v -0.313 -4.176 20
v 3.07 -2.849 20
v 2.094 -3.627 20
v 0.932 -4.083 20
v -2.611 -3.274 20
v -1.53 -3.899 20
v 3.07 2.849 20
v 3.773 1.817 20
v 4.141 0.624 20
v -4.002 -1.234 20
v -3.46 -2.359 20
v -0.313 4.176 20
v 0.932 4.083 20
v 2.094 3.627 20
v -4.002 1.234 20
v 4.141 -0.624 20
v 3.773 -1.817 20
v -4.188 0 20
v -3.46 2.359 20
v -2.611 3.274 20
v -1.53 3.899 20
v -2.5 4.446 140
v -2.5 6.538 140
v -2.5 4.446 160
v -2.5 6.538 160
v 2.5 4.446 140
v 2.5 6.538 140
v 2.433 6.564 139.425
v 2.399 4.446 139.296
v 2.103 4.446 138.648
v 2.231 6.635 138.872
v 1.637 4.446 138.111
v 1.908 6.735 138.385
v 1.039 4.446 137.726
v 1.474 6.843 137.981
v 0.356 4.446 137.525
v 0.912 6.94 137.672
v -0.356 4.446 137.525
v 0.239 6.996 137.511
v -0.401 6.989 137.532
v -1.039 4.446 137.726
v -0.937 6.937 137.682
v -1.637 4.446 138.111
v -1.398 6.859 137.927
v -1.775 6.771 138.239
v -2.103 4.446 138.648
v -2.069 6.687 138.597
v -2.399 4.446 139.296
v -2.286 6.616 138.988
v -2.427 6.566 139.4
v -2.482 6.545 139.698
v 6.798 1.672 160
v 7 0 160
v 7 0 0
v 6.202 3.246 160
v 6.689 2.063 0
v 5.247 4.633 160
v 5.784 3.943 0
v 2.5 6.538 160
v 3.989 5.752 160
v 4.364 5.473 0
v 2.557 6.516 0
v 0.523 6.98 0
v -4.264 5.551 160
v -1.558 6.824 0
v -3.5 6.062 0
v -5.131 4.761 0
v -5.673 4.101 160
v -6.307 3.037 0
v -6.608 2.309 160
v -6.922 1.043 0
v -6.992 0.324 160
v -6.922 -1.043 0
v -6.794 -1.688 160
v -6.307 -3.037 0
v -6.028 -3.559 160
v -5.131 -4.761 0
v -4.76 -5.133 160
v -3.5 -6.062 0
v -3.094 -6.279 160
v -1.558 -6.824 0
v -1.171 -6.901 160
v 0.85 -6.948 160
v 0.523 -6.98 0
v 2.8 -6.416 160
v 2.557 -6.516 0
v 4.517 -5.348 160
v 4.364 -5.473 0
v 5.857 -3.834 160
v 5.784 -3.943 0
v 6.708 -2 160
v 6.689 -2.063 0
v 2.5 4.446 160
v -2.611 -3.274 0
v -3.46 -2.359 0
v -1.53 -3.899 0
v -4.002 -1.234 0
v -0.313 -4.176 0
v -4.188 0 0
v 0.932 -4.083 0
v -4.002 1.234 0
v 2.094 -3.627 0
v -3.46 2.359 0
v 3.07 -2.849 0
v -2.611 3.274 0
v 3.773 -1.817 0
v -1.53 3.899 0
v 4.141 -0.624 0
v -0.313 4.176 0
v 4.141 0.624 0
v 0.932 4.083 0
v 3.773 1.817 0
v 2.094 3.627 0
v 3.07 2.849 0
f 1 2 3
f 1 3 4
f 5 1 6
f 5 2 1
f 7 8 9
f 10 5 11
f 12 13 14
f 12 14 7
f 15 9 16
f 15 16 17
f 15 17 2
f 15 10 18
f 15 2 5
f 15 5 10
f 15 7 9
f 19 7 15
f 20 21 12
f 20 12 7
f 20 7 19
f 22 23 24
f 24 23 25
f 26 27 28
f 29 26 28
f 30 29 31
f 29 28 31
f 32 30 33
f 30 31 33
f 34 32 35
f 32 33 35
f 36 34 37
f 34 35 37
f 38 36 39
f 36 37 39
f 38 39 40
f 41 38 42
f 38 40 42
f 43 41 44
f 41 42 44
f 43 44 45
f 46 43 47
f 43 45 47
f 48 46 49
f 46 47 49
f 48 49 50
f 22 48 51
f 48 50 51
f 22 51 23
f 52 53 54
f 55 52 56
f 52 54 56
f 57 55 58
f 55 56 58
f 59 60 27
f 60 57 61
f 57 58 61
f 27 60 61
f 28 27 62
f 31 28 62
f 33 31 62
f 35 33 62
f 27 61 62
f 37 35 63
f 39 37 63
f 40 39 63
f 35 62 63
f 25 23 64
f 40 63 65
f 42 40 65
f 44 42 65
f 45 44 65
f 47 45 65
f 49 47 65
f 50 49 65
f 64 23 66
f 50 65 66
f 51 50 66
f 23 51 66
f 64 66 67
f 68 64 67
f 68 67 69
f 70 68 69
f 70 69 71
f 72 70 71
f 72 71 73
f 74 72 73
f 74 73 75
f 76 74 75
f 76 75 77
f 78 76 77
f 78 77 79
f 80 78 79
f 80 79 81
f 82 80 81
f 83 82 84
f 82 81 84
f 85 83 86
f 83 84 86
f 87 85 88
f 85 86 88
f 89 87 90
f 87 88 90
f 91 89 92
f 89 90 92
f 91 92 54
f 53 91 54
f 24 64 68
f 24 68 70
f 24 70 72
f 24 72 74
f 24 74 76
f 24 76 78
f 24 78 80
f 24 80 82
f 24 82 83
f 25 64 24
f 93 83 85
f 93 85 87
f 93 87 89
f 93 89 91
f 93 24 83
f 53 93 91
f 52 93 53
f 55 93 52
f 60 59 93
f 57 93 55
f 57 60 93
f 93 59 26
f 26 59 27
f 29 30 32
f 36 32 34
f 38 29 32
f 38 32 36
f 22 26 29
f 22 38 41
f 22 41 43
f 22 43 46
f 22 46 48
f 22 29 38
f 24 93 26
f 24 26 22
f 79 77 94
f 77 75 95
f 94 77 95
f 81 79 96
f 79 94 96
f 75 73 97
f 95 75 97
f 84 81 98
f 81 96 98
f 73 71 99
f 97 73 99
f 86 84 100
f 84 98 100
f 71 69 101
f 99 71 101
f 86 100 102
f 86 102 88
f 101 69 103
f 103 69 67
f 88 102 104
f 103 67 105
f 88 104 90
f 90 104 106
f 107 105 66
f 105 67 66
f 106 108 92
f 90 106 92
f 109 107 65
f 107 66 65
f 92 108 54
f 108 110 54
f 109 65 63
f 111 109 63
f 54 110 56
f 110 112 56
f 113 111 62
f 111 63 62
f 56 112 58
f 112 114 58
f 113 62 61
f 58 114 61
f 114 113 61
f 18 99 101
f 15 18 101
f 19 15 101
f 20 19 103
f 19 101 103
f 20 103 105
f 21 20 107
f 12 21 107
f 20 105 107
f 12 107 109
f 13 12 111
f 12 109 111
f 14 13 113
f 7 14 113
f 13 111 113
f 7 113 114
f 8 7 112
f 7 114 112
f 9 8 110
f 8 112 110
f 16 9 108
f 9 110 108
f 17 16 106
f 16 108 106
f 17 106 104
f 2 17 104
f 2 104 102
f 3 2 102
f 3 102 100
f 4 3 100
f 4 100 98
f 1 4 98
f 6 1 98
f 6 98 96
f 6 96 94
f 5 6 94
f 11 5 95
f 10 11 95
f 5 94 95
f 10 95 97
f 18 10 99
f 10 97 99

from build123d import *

# Parameters (mm, degrees)
ESQUISSE1_R                  = 7
BOSS_EXTRU_1_DEPTH           = 160
ESQUISSE2_R                  = 4.188125
ENL_V_MAT_EXTRU_1_DEPTH      = 20
ENL_V_MAT_EXTRU_2_DEPTH      = 2.5
ENL_V_MAT_EXTRU_2_DEPTH_BACK = 2.5


with BuildPart() as part:
    # Esquisse1 → Boss.-Extru.1 (new body)
    with BuildSketch(Plane.XY):
        Circle(ESQUISSE1_R)
    extrude(amount=BOSS_EXTRU_1_DEPTH)

    # Esquisse2 → Enlèv. mat.-Extru.1 (cut)
    with BuildSketch(Plane(origin=(0, 0, 0), x_dir=(-1, 0, 0), z_dir=(0, 0, -1))):
        Circle(ESQUISSE2_R)
    extrude(amount=-ENL_V_MAT_EXTRU_1_DEPTH, mode=Mode.SUBTRACT)

    # Esquisse3 → Enlèv. mat.-Extru.2 (cut, two sides: drawn at the far end of the back side and taken through both)
    with BuildSketch(Plane.XZ.offset(-6.946049008).offset(-ENL_V_MAT_EXTRU_2_DEPTH_BACK)):
        with BuildLine():
            Line((2.5, 160), (2.5, 140))
            ThreePointArc((2.5, 140), (0, 137.5), (-2.5, 140))
            Line((-2.5, 140), (-2.5, 160))
            ThreePointArc((-2.5, 160), (0, 162.5), (2.5, 160))
        make_face()
    extrude(amount=ENL_V_MAT_EXTRU_2_DEPTH + ENL_V_MAT_EXTRU_2_DEPTH_BACK, mode=Mode.SUBTRACT)


solid = part.part
